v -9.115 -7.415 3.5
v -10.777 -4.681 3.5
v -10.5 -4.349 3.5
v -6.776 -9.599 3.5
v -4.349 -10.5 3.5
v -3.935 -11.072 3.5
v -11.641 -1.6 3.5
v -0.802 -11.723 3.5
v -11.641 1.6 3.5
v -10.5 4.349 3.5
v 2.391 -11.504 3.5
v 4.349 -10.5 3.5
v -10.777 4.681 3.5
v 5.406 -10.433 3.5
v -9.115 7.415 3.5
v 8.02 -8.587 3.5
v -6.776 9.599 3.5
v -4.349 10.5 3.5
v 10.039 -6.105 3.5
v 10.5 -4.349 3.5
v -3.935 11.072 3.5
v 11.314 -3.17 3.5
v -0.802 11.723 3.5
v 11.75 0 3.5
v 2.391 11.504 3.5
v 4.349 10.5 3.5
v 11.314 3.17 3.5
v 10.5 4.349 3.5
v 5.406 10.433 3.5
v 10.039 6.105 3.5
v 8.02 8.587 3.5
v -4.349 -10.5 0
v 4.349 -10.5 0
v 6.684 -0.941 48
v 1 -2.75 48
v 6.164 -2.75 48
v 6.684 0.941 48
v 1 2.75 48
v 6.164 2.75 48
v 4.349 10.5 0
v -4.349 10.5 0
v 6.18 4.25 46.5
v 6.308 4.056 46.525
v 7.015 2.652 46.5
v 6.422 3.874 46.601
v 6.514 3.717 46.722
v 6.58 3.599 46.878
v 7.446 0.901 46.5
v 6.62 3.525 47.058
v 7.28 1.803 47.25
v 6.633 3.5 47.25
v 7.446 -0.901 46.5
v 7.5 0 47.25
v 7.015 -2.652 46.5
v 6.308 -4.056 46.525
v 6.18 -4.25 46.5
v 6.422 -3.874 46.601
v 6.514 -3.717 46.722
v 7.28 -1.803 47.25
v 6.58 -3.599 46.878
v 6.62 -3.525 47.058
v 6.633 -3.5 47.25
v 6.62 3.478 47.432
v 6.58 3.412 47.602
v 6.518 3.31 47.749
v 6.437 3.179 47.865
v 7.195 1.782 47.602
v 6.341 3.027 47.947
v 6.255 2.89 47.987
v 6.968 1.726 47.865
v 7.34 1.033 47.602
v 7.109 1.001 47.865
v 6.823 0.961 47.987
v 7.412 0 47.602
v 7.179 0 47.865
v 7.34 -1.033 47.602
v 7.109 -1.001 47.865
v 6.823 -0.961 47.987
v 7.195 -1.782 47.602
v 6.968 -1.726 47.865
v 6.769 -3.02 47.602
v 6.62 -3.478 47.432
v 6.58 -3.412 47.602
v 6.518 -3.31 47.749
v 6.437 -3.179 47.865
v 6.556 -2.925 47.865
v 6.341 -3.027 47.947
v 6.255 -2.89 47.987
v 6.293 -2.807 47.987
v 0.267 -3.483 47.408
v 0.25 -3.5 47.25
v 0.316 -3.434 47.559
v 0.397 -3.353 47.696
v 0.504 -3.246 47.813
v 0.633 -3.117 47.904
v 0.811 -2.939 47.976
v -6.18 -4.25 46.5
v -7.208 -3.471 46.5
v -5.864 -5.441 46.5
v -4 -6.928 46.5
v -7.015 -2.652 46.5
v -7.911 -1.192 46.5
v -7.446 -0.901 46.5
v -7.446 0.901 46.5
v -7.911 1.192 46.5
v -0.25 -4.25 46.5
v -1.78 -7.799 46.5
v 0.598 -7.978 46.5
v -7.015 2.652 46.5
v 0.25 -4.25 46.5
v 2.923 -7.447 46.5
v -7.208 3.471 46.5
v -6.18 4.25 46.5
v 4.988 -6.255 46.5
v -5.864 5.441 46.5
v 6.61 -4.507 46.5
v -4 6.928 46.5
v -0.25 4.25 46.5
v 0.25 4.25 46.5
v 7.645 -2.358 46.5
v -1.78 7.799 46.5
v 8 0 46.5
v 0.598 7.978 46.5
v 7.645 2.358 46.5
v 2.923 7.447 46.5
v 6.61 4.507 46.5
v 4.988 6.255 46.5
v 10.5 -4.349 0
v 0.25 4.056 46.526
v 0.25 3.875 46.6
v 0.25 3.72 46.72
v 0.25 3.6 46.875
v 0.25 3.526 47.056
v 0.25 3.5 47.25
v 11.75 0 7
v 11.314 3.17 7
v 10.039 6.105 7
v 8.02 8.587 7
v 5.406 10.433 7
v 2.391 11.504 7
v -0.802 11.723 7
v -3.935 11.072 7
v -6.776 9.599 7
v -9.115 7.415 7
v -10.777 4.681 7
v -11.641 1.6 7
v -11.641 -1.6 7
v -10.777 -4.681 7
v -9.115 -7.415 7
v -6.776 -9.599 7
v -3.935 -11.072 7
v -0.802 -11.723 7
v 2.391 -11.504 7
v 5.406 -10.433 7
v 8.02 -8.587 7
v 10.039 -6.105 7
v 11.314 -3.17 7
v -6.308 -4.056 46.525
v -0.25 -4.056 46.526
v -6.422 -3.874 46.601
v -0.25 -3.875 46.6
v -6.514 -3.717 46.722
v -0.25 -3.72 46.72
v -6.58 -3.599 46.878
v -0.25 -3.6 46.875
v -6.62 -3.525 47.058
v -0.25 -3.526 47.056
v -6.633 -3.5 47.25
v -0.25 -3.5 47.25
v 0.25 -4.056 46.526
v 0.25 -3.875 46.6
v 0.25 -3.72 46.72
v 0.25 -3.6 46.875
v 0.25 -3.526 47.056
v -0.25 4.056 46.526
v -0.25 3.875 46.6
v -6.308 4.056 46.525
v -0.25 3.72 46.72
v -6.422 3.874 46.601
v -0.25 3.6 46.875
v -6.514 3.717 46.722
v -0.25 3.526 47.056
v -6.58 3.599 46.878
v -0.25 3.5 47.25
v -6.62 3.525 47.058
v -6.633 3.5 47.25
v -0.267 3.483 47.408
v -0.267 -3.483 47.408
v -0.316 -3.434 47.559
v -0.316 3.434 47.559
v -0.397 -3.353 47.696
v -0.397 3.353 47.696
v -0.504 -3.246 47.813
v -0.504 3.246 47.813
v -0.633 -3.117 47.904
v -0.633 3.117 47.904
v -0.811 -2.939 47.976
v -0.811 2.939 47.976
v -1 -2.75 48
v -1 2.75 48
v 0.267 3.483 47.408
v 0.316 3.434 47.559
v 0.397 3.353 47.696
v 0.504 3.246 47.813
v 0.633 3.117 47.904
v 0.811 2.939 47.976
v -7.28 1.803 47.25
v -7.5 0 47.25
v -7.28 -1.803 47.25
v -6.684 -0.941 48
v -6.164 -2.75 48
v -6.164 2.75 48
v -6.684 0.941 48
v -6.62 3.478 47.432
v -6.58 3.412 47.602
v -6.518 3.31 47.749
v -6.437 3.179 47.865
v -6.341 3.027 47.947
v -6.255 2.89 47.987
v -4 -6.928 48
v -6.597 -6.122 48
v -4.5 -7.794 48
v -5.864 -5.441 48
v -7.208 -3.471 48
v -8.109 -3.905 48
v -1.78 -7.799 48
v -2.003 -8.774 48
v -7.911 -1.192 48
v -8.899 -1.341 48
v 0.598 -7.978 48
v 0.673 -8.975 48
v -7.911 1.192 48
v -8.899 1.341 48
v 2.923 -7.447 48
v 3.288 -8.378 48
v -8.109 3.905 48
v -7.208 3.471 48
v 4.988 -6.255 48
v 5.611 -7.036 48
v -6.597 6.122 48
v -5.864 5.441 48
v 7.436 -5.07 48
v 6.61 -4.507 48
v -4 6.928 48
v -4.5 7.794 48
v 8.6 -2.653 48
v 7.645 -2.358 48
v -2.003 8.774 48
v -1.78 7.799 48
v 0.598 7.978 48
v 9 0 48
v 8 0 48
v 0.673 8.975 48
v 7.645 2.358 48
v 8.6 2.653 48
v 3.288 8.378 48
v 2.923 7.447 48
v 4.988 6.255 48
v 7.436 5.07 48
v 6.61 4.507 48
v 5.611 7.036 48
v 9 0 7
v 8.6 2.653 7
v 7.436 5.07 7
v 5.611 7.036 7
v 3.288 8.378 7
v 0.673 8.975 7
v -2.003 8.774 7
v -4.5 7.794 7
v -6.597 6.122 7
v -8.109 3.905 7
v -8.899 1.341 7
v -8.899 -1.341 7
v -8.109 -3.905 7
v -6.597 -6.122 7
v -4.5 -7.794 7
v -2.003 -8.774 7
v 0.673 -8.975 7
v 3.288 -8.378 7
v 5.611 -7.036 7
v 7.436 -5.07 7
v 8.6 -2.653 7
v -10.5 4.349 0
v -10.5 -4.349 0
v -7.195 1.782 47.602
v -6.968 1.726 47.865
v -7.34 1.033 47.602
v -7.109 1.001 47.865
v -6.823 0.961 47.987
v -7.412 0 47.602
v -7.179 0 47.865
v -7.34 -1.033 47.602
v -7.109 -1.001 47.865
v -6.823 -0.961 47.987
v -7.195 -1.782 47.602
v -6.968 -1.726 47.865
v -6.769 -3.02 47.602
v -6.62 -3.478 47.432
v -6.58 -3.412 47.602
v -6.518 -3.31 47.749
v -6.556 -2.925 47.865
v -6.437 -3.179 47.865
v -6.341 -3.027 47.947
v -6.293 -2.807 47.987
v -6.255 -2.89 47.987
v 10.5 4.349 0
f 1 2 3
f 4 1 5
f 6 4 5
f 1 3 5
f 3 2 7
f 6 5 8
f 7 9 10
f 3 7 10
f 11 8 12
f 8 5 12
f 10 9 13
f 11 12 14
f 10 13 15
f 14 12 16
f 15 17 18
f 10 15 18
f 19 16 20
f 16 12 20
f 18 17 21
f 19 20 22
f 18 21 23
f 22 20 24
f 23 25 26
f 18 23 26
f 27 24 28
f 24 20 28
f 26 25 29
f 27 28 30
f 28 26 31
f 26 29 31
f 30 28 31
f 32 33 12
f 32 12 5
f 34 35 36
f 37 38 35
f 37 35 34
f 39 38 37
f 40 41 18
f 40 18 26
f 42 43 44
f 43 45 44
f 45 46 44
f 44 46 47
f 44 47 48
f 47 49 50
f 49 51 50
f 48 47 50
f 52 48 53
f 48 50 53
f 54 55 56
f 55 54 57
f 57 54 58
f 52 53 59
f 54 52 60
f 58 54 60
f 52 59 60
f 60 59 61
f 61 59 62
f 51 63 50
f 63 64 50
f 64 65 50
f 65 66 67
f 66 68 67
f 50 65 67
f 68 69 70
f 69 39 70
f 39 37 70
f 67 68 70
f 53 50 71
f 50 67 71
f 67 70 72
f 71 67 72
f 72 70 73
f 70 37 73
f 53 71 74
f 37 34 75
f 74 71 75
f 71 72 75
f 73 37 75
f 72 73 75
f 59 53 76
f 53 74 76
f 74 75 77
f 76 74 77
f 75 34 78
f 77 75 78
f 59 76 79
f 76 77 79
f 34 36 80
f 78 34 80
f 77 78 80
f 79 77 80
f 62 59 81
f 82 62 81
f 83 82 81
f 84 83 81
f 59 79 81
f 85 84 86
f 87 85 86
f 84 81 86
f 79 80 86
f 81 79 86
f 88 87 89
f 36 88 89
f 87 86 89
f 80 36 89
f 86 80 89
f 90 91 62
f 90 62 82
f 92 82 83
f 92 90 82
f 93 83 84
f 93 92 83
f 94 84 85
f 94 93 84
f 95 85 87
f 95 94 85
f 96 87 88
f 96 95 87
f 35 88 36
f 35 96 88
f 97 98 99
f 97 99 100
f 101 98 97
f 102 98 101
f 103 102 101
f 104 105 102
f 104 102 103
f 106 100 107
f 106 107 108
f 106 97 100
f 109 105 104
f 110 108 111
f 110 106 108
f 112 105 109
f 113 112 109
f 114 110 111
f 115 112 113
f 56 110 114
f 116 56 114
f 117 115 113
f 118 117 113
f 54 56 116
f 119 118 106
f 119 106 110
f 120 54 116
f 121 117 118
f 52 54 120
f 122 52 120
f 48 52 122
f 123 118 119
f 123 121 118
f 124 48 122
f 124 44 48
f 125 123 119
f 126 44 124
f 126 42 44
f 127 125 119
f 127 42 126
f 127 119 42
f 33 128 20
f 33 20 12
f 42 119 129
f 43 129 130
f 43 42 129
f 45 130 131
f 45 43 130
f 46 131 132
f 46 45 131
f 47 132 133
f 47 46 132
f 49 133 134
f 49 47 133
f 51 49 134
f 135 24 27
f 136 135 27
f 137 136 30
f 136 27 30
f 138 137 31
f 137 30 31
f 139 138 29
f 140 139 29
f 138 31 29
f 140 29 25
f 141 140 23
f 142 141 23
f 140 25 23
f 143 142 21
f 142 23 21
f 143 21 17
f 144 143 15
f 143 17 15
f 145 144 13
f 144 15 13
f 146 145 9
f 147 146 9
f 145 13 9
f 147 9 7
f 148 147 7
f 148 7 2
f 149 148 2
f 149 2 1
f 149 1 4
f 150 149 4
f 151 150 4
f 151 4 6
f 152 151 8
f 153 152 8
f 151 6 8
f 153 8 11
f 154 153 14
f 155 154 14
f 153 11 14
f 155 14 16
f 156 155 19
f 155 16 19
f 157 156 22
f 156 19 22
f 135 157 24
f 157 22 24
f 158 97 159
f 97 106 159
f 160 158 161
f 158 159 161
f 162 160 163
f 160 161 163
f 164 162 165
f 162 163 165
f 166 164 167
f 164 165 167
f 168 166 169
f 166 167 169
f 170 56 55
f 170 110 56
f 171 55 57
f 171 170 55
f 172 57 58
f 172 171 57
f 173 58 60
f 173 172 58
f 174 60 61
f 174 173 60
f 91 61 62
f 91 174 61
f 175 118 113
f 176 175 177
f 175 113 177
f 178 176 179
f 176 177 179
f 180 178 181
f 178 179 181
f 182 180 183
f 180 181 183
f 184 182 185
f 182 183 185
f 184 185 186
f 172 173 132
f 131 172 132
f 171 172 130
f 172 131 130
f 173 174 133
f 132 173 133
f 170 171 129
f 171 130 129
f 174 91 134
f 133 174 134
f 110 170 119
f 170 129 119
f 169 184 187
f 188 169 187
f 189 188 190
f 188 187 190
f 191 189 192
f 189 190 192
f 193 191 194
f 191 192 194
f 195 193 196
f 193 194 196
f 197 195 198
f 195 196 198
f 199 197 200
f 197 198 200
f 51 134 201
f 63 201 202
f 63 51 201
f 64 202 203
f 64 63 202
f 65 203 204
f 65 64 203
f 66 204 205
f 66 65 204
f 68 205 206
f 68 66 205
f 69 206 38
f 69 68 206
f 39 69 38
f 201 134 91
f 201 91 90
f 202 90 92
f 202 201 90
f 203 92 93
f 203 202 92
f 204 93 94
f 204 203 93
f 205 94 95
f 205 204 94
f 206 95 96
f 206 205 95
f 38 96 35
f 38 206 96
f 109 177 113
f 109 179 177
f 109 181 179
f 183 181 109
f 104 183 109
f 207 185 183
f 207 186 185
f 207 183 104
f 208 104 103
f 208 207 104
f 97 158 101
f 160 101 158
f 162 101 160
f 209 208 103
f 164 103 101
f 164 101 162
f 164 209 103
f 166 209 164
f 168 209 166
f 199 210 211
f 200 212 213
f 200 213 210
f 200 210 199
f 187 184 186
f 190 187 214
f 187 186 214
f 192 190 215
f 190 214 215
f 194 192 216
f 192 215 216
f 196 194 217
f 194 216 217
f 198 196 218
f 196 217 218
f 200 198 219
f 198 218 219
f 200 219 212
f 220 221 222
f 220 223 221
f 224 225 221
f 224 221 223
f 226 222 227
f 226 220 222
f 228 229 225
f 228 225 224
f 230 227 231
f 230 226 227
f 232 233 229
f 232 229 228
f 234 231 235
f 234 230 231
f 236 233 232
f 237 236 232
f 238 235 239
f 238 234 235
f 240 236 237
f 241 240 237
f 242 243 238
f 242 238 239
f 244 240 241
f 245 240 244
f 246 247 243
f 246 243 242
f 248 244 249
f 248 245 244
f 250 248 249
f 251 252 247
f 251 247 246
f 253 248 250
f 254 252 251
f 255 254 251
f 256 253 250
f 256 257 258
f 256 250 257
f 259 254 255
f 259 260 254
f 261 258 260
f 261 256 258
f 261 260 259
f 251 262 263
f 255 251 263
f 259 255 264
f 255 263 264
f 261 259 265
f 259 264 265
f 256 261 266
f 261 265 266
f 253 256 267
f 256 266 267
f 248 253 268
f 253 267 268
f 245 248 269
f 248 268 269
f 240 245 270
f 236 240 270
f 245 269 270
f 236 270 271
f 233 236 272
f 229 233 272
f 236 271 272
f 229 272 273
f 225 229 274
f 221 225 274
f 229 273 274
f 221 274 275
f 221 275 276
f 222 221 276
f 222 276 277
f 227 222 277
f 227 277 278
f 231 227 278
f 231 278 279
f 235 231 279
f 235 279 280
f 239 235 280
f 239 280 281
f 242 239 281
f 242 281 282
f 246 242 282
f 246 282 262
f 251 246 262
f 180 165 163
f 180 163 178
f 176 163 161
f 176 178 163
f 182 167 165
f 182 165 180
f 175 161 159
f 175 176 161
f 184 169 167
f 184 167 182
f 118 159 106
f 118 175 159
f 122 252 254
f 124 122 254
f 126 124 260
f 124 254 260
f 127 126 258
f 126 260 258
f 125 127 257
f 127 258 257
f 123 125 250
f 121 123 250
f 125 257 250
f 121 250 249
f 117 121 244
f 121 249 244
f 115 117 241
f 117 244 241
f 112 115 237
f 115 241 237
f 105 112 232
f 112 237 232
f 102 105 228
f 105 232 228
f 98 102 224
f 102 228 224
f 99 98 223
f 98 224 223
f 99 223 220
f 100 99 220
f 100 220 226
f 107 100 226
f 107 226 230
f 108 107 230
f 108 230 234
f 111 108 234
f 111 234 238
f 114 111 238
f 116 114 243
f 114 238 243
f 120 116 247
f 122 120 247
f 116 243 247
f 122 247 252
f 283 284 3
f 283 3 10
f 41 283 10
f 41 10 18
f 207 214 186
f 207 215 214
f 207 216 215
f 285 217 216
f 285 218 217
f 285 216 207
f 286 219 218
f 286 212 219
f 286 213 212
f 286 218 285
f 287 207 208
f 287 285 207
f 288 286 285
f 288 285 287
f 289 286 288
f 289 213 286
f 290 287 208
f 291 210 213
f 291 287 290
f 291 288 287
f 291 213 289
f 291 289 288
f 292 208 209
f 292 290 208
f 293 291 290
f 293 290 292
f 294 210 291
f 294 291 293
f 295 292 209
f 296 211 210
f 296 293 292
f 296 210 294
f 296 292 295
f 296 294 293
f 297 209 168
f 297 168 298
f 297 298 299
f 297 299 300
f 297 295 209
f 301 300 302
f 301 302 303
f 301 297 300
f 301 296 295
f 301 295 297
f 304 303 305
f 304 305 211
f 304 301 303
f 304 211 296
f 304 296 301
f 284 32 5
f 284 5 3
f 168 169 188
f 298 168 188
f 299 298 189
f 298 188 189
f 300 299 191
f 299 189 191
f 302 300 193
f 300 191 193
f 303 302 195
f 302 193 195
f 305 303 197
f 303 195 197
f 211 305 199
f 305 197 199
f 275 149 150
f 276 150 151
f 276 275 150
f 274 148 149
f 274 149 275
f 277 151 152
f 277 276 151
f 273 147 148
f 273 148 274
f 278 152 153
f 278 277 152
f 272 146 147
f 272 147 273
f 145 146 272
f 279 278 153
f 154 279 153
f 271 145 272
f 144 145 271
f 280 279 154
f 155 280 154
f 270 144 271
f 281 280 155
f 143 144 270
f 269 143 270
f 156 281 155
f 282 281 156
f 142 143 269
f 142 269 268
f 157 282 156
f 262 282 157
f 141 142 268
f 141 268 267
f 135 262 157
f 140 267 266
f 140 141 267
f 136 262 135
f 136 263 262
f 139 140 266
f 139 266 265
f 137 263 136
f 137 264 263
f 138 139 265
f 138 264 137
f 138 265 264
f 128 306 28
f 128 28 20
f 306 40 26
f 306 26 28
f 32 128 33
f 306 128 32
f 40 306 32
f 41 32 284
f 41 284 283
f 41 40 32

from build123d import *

# Parameters (mm, degrees)
SKETCH_1_R          = 9
EXTRUDE_1_DEPTH     = 48
EXTRUDE_2_DEPTH     = 3.5
SKETCH_3_R          = 11.75
EXTRUDE_3_DEPTH     = 3.5
SKETCH_4_R          = 8
CUT_EXTRUDE_1_DEPTH = 1.5
FILLET_1_R          = 0.75


with BuildPart() as part:
    # 草图1 → 凸台-拉伸1 (new body)
    with BuildSketch(Plane.XY):
        Circle(SKETCH_1_R)
    extrude(amount=EXTRUDE_1_DEPTH)

    # 草图2 → 凸台-拉伸2 (add)
    with BuildSketch(Plane(origin=(0, 0, 0), x_dir=(-1, 0, 0), z_dir=(0, 0, -1))):
        Polygon((-10.5, 4.349242405), (-10.5, -4.349242405), (-4.349242405, -10.5), (4.349242405, -10.5), (10.5, -4.349242405), (10.5, 4.349242405), (4.349242405, 10.5), (-4.349242405, 10.5), align=None)
    extrude(amount=-EXTRUDE_2_DEPTH)

    # 草图3 → 凸台-拉伸3 (add)
    with BuildSketch(Plane.XY.offset(3.5)):
        Circle(SKETCH_3_R)
    extrude(amount=EXTRUDE_3_DEPTH)

    # 草图4 → 切除-拉伸1 (cut)
    with BuildSketch(Plane.XY.offset(48)):
        Circle(SKETCH_4_R)
        with BuildLine():
            Line((6.633249581, -3.5), (0.25, -3.5))
            Line((0.25, -3.5), (0.25, 3.5))
            Line((0.25, 3.5), (6.633249581, 3.5))
            ThreePointArc((6.633249581, 3.5), (7.5, 0), (6.633249581, -3.5))
        make_face(mode=Mode.SUBTRACT)
        with BuildLine():
            Line((-0.25, -3.5), (-0.25, 3.5))
            Line((-0.25, 3.5), (-6.633249581, 3.5))
            ThreePointArc((-6.633249581, 3.5), (-7.5, 0), (-6.633249581, -3.5))
            Line((-6.633249581, -3.5), (-0.25, -3.5))
        make_face(mode=Mode.SUBTRACT)
    extrude(amount=-CUT_EXTRUDE_1_DEPTH, mode=Mode.SUBTRACT)

    # 圆角1
    fillet_1_edges = [part.edges().sort_by_distance(p)[0] for p in [
        (-3.44162479, 3.5, 46.5),
        (-3.44162479, -3.5, 48),
        (-7.5, 0, 48),
        (-0.25, 0, 48),
        (0.25, 0, 48),
        (3.44162479, -3.5, 48),
        (7.5, 0, 48),
        (3.44162479, 3.5, 48),
        (-3.44162479, -3.5, 46.5),
        (3.44162479, -3.5, 46.5),
        (3.44162479, 3.5, 46.5),
        (-3.44162479, 3.5, 48),
    ]]
    fillet(fillet_1_edges, radius=FILLET_1_R - 0.0001)  # a hair under: the kernel refuses the full size


solid = part.part
